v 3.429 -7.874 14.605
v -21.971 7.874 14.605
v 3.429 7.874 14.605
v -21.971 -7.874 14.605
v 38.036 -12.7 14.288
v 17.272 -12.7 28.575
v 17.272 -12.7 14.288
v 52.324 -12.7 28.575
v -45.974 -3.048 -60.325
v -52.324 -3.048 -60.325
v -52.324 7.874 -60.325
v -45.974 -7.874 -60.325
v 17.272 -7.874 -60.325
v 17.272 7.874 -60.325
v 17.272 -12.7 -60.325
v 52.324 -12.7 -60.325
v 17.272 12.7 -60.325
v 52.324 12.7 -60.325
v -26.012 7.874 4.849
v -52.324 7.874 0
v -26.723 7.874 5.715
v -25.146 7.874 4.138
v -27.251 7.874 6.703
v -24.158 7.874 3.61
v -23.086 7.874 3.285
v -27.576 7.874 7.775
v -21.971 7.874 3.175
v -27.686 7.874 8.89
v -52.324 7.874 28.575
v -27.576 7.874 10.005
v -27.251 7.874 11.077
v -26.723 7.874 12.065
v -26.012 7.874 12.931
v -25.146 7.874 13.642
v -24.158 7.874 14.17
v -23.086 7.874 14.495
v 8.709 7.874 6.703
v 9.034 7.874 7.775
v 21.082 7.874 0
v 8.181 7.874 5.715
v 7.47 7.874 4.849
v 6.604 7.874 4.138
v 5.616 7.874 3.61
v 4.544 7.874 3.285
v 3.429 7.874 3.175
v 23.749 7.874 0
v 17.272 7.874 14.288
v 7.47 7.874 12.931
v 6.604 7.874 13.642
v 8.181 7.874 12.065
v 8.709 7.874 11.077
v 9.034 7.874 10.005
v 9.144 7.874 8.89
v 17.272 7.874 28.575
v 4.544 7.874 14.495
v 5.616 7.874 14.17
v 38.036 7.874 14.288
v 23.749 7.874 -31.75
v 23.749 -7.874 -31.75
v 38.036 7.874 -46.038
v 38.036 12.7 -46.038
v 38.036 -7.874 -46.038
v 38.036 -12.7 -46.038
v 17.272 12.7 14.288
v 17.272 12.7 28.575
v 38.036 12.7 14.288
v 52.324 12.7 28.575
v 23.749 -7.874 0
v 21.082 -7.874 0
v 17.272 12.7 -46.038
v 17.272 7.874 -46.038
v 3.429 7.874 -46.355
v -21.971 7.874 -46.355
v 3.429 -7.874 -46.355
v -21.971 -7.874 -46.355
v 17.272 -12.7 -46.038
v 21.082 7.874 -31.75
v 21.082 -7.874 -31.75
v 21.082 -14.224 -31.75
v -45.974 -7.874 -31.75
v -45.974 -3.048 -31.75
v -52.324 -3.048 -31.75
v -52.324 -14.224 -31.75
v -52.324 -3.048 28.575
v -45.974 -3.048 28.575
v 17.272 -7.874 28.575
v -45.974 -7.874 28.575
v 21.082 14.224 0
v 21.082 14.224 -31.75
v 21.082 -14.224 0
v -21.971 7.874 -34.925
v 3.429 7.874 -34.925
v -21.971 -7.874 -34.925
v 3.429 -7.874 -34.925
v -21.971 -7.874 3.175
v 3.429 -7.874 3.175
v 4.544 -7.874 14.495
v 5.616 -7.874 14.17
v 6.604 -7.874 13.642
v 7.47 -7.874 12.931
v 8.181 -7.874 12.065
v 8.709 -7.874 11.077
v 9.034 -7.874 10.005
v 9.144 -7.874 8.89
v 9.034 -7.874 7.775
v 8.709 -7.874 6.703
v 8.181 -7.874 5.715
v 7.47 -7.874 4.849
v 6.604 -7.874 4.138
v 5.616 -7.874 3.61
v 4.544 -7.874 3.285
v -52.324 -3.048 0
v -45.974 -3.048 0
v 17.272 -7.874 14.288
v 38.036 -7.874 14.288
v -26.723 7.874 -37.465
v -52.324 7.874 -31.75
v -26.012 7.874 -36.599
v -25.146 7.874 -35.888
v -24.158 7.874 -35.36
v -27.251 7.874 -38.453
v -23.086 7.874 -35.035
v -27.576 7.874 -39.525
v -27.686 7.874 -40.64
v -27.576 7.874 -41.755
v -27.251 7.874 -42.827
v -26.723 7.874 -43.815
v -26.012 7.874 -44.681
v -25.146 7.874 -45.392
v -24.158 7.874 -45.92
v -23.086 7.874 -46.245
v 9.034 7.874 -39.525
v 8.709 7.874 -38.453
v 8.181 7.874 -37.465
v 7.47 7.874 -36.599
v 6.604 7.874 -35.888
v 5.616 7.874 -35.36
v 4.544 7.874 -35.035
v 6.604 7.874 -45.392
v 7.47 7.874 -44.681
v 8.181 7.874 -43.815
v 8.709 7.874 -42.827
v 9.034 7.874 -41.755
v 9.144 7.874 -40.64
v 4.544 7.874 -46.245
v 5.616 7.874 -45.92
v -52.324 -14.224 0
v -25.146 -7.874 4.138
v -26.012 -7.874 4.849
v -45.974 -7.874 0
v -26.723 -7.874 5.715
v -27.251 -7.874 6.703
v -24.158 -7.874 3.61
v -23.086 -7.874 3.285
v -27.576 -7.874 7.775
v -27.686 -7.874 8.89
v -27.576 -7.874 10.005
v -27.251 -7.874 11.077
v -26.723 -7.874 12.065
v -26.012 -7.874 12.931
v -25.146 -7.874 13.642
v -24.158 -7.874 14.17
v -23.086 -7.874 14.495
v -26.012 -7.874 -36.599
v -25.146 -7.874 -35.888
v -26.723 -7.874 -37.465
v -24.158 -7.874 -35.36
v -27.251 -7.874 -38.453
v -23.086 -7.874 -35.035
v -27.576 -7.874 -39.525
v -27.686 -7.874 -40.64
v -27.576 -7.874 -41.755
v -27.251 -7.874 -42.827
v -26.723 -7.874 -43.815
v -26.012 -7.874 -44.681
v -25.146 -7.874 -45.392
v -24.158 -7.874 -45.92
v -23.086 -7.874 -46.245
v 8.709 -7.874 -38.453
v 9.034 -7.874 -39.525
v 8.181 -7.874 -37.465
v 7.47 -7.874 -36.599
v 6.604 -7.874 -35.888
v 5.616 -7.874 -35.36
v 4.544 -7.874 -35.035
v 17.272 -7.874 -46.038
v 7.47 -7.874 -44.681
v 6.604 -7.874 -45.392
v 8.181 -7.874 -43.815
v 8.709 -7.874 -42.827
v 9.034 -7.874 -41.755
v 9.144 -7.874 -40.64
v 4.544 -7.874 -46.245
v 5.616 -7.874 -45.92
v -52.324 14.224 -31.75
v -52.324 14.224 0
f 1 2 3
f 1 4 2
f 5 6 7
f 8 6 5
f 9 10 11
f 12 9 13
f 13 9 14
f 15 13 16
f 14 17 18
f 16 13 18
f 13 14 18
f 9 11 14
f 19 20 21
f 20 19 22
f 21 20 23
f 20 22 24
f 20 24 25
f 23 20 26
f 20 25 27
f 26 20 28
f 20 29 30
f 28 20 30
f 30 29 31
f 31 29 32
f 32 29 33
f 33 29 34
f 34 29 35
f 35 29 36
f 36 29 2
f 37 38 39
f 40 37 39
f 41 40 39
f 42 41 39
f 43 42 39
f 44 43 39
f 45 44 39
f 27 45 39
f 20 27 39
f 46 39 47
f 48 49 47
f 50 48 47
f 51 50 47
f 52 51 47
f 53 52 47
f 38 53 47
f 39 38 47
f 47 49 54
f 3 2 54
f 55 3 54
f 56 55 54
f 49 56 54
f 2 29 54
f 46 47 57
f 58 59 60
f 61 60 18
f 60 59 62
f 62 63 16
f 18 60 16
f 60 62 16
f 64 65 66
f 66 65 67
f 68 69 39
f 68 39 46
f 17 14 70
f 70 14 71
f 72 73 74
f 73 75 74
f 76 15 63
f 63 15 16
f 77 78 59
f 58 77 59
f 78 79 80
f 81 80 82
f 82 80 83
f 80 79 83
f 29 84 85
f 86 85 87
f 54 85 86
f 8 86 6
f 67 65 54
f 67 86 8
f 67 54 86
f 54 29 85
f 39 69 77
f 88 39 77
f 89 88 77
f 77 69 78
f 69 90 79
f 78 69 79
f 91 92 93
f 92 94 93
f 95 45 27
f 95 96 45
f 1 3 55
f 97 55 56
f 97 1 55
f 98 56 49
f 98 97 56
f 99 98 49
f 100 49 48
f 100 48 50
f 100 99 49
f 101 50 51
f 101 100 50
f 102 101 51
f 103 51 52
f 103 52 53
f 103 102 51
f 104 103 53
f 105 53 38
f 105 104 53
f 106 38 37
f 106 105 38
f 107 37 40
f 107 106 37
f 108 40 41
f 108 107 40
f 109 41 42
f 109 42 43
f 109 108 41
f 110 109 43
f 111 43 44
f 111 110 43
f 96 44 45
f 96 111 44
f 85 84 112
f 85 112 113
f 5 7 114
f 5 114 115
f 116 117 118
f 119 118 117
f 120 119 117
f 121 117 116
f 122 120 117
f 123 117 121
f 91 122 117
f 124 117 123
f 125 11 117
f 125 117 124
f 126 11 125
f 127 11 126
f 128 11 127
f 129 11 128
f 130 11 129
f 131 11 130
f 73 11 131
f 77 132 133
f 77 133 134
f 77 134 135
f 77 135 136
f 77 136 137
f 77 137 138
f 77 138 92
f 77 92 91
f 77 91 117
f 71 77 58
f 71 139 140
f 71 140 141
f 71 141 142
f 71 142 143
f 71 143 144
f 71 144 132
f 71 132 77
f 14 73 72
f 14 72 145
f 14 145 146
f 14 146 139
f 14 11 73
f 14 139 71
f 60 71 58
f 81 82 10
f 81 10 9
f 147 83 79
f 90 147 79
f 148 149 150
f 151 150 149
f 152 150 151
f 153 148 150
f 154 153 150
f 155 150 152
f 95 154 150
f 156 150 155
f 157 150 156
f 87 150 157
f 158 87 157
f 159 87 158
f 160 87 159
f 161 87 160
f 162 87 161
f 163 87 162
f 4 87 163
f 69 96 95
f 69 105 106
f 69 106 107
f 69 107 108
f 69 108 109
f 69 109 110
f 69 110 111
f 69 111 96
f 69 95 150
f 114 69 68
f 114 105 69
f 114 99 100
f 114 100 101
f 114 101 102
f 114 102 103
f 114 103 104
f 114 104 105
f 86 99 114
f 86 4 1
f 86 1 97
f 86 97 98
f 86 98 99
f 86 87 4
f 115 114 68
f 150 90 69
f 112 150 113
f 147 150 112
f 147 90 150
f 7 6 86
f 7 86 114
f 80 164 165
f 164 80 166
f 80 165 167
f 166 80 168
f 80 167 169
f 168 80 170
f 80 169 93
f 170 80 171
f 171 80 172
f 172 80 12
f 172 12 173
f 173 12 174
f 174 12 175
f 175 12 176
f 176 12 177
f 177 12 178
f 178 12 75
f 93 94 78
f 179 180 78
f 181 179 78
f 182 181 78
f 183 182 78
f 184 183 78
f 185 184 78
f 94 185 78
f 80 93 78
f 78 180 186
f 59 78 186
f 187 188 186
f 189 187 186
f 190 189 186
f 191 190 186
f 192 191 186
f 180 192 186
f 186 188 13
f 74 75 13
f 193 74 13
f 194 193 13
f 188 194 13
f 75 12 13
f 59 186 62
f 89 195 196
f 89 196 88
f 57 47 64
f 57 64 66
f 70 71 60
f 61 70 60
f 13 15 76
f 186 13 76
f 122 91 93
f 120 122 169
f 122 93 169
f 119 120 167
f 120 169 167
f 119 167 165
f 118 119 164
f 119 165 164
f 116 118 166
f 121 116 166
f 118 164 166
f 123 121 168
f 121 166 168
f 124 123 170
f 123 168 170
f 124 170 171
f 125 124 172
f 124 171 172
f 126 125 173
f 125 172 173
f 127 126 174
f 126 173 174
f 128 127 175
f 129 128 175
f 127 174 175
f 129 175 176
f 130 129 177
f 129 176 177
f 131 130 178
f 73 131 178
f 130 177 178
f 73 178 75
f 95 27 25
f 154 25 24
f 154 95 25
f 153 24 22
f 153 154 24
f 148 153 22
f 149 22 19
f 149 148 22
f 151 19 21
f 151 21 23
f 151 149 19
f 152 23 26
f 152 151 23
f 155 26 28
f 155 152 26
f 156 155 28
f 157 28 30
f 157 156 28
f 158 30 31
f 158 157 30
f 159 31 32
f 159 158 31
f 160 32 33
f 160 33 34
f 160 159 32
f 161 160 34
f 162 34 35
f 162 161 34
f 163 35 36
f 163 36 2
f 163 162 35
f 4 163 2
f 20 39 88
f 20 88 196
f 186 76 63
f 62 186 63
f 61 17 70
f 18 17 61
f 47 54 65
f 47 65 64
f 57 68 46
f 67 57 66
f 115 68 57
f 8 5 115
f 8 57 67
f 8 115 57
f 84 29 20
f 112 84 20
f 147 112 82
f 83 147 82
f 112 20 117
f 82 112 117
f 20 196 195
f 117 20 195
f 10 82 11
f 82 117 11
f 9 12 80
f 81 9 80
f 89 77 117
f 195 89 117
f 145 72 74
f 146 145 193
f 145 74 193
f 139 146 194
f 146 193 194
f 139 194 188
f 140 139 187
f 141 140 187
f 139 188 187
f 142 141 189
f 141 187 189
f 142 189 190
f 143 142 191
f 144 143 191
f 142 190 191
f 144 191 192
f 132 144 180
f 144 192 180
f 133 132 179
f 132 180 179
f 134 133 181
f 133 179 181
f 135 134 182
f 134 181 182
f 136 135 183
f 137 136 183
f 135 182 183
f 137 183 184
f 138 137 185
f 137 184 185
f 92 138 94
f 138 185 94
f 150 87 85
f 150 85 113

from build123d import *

# Parameters (mm, degrees)
F1_DEPTH = 14.224
F2_DEPTH = 12.7
F3_DEPTH = 7.874
F0_W     = 6.35
F0_H     = 28.575
F4_DEPTH = 7.874
F5_DEPTH = 3.048


with BuildPart() as f1:
    # F0 (on Front) → F1 (new body, symmetric)
    with BuildSketch(Plane.XZ):
        Polygon((-45.974, 0), (-52.324, 0), (-52.324, -15.875), (21.082, -15.875), (21.082, 0), align=None)
    extrude(amount=F1_DEPTH, both=True)



with BuildPart() as f2:
    # F0 (on Front) → F2 (new body, symmetric)
    with BuildSketch(Plane.XZ):
        Polygon((52.324, 28.575), (17.272, 28.575), (17.272, 14.2875), (38.0365, 14.2875), align=None)
    extrude(amount=F2_DEPTH, both=True)


with BuildPart() as f1_1:
    add(f1.part)

    add(f2.part)  # F3 merges F2
    # F0 (on Front) → F3 (join, symmetric)
    with BuildSketch(Plane.XZ):
        Polygon((17.272, 28.575), (-45.974, 28.575), (-45.974, 0), (21.082, 0), (23.749, 0), (38.0365, 14.2875), (17.272, 14.2875), align=None)
        with BuildLine():
            ThreePointArc((-21.971, 3.175), (-27.686, 8.89), (-21.971, 14.605))
            Line((-21.971, 14.605), (3.429, 14.605))
            ThreePointArc((3.429, 14.605), (9.144, 8.89), (3.429, 3.175))
            Line((3.429, 3.175), (-21.971, 3.175))
        make_face(mode=Mode.SUBTRACT)
    extrude(amount=F3_DEPTH, both=True)

    # F0 (on Front) → F4 (join)
    with BuildSketch(Plane.XZ):
        with Locations((-49.149, 14.2875)):
            Rectangle(F0_W, F0_H)
    extrude(amount=-F4_DEPTH)

    # F0 (on Front) → F5 (join)
    with BuildSketch(Plane.XZ):
        with Locations((-49.149, 14.2875)):
            Rectangle(F0_W, F0_H)
    extrude(amount=F5_DEPTH)

    # F6: F1 across face


with BuildPart() as f1_2:
    add(f1_1.part)
    add(f1_1.part.mirror(Plane(origin=(-15.621, 0, -15.875), x_dir=(1, 0, 0), z_dir=(0, 0, -1))))


solid = f1_2.part
